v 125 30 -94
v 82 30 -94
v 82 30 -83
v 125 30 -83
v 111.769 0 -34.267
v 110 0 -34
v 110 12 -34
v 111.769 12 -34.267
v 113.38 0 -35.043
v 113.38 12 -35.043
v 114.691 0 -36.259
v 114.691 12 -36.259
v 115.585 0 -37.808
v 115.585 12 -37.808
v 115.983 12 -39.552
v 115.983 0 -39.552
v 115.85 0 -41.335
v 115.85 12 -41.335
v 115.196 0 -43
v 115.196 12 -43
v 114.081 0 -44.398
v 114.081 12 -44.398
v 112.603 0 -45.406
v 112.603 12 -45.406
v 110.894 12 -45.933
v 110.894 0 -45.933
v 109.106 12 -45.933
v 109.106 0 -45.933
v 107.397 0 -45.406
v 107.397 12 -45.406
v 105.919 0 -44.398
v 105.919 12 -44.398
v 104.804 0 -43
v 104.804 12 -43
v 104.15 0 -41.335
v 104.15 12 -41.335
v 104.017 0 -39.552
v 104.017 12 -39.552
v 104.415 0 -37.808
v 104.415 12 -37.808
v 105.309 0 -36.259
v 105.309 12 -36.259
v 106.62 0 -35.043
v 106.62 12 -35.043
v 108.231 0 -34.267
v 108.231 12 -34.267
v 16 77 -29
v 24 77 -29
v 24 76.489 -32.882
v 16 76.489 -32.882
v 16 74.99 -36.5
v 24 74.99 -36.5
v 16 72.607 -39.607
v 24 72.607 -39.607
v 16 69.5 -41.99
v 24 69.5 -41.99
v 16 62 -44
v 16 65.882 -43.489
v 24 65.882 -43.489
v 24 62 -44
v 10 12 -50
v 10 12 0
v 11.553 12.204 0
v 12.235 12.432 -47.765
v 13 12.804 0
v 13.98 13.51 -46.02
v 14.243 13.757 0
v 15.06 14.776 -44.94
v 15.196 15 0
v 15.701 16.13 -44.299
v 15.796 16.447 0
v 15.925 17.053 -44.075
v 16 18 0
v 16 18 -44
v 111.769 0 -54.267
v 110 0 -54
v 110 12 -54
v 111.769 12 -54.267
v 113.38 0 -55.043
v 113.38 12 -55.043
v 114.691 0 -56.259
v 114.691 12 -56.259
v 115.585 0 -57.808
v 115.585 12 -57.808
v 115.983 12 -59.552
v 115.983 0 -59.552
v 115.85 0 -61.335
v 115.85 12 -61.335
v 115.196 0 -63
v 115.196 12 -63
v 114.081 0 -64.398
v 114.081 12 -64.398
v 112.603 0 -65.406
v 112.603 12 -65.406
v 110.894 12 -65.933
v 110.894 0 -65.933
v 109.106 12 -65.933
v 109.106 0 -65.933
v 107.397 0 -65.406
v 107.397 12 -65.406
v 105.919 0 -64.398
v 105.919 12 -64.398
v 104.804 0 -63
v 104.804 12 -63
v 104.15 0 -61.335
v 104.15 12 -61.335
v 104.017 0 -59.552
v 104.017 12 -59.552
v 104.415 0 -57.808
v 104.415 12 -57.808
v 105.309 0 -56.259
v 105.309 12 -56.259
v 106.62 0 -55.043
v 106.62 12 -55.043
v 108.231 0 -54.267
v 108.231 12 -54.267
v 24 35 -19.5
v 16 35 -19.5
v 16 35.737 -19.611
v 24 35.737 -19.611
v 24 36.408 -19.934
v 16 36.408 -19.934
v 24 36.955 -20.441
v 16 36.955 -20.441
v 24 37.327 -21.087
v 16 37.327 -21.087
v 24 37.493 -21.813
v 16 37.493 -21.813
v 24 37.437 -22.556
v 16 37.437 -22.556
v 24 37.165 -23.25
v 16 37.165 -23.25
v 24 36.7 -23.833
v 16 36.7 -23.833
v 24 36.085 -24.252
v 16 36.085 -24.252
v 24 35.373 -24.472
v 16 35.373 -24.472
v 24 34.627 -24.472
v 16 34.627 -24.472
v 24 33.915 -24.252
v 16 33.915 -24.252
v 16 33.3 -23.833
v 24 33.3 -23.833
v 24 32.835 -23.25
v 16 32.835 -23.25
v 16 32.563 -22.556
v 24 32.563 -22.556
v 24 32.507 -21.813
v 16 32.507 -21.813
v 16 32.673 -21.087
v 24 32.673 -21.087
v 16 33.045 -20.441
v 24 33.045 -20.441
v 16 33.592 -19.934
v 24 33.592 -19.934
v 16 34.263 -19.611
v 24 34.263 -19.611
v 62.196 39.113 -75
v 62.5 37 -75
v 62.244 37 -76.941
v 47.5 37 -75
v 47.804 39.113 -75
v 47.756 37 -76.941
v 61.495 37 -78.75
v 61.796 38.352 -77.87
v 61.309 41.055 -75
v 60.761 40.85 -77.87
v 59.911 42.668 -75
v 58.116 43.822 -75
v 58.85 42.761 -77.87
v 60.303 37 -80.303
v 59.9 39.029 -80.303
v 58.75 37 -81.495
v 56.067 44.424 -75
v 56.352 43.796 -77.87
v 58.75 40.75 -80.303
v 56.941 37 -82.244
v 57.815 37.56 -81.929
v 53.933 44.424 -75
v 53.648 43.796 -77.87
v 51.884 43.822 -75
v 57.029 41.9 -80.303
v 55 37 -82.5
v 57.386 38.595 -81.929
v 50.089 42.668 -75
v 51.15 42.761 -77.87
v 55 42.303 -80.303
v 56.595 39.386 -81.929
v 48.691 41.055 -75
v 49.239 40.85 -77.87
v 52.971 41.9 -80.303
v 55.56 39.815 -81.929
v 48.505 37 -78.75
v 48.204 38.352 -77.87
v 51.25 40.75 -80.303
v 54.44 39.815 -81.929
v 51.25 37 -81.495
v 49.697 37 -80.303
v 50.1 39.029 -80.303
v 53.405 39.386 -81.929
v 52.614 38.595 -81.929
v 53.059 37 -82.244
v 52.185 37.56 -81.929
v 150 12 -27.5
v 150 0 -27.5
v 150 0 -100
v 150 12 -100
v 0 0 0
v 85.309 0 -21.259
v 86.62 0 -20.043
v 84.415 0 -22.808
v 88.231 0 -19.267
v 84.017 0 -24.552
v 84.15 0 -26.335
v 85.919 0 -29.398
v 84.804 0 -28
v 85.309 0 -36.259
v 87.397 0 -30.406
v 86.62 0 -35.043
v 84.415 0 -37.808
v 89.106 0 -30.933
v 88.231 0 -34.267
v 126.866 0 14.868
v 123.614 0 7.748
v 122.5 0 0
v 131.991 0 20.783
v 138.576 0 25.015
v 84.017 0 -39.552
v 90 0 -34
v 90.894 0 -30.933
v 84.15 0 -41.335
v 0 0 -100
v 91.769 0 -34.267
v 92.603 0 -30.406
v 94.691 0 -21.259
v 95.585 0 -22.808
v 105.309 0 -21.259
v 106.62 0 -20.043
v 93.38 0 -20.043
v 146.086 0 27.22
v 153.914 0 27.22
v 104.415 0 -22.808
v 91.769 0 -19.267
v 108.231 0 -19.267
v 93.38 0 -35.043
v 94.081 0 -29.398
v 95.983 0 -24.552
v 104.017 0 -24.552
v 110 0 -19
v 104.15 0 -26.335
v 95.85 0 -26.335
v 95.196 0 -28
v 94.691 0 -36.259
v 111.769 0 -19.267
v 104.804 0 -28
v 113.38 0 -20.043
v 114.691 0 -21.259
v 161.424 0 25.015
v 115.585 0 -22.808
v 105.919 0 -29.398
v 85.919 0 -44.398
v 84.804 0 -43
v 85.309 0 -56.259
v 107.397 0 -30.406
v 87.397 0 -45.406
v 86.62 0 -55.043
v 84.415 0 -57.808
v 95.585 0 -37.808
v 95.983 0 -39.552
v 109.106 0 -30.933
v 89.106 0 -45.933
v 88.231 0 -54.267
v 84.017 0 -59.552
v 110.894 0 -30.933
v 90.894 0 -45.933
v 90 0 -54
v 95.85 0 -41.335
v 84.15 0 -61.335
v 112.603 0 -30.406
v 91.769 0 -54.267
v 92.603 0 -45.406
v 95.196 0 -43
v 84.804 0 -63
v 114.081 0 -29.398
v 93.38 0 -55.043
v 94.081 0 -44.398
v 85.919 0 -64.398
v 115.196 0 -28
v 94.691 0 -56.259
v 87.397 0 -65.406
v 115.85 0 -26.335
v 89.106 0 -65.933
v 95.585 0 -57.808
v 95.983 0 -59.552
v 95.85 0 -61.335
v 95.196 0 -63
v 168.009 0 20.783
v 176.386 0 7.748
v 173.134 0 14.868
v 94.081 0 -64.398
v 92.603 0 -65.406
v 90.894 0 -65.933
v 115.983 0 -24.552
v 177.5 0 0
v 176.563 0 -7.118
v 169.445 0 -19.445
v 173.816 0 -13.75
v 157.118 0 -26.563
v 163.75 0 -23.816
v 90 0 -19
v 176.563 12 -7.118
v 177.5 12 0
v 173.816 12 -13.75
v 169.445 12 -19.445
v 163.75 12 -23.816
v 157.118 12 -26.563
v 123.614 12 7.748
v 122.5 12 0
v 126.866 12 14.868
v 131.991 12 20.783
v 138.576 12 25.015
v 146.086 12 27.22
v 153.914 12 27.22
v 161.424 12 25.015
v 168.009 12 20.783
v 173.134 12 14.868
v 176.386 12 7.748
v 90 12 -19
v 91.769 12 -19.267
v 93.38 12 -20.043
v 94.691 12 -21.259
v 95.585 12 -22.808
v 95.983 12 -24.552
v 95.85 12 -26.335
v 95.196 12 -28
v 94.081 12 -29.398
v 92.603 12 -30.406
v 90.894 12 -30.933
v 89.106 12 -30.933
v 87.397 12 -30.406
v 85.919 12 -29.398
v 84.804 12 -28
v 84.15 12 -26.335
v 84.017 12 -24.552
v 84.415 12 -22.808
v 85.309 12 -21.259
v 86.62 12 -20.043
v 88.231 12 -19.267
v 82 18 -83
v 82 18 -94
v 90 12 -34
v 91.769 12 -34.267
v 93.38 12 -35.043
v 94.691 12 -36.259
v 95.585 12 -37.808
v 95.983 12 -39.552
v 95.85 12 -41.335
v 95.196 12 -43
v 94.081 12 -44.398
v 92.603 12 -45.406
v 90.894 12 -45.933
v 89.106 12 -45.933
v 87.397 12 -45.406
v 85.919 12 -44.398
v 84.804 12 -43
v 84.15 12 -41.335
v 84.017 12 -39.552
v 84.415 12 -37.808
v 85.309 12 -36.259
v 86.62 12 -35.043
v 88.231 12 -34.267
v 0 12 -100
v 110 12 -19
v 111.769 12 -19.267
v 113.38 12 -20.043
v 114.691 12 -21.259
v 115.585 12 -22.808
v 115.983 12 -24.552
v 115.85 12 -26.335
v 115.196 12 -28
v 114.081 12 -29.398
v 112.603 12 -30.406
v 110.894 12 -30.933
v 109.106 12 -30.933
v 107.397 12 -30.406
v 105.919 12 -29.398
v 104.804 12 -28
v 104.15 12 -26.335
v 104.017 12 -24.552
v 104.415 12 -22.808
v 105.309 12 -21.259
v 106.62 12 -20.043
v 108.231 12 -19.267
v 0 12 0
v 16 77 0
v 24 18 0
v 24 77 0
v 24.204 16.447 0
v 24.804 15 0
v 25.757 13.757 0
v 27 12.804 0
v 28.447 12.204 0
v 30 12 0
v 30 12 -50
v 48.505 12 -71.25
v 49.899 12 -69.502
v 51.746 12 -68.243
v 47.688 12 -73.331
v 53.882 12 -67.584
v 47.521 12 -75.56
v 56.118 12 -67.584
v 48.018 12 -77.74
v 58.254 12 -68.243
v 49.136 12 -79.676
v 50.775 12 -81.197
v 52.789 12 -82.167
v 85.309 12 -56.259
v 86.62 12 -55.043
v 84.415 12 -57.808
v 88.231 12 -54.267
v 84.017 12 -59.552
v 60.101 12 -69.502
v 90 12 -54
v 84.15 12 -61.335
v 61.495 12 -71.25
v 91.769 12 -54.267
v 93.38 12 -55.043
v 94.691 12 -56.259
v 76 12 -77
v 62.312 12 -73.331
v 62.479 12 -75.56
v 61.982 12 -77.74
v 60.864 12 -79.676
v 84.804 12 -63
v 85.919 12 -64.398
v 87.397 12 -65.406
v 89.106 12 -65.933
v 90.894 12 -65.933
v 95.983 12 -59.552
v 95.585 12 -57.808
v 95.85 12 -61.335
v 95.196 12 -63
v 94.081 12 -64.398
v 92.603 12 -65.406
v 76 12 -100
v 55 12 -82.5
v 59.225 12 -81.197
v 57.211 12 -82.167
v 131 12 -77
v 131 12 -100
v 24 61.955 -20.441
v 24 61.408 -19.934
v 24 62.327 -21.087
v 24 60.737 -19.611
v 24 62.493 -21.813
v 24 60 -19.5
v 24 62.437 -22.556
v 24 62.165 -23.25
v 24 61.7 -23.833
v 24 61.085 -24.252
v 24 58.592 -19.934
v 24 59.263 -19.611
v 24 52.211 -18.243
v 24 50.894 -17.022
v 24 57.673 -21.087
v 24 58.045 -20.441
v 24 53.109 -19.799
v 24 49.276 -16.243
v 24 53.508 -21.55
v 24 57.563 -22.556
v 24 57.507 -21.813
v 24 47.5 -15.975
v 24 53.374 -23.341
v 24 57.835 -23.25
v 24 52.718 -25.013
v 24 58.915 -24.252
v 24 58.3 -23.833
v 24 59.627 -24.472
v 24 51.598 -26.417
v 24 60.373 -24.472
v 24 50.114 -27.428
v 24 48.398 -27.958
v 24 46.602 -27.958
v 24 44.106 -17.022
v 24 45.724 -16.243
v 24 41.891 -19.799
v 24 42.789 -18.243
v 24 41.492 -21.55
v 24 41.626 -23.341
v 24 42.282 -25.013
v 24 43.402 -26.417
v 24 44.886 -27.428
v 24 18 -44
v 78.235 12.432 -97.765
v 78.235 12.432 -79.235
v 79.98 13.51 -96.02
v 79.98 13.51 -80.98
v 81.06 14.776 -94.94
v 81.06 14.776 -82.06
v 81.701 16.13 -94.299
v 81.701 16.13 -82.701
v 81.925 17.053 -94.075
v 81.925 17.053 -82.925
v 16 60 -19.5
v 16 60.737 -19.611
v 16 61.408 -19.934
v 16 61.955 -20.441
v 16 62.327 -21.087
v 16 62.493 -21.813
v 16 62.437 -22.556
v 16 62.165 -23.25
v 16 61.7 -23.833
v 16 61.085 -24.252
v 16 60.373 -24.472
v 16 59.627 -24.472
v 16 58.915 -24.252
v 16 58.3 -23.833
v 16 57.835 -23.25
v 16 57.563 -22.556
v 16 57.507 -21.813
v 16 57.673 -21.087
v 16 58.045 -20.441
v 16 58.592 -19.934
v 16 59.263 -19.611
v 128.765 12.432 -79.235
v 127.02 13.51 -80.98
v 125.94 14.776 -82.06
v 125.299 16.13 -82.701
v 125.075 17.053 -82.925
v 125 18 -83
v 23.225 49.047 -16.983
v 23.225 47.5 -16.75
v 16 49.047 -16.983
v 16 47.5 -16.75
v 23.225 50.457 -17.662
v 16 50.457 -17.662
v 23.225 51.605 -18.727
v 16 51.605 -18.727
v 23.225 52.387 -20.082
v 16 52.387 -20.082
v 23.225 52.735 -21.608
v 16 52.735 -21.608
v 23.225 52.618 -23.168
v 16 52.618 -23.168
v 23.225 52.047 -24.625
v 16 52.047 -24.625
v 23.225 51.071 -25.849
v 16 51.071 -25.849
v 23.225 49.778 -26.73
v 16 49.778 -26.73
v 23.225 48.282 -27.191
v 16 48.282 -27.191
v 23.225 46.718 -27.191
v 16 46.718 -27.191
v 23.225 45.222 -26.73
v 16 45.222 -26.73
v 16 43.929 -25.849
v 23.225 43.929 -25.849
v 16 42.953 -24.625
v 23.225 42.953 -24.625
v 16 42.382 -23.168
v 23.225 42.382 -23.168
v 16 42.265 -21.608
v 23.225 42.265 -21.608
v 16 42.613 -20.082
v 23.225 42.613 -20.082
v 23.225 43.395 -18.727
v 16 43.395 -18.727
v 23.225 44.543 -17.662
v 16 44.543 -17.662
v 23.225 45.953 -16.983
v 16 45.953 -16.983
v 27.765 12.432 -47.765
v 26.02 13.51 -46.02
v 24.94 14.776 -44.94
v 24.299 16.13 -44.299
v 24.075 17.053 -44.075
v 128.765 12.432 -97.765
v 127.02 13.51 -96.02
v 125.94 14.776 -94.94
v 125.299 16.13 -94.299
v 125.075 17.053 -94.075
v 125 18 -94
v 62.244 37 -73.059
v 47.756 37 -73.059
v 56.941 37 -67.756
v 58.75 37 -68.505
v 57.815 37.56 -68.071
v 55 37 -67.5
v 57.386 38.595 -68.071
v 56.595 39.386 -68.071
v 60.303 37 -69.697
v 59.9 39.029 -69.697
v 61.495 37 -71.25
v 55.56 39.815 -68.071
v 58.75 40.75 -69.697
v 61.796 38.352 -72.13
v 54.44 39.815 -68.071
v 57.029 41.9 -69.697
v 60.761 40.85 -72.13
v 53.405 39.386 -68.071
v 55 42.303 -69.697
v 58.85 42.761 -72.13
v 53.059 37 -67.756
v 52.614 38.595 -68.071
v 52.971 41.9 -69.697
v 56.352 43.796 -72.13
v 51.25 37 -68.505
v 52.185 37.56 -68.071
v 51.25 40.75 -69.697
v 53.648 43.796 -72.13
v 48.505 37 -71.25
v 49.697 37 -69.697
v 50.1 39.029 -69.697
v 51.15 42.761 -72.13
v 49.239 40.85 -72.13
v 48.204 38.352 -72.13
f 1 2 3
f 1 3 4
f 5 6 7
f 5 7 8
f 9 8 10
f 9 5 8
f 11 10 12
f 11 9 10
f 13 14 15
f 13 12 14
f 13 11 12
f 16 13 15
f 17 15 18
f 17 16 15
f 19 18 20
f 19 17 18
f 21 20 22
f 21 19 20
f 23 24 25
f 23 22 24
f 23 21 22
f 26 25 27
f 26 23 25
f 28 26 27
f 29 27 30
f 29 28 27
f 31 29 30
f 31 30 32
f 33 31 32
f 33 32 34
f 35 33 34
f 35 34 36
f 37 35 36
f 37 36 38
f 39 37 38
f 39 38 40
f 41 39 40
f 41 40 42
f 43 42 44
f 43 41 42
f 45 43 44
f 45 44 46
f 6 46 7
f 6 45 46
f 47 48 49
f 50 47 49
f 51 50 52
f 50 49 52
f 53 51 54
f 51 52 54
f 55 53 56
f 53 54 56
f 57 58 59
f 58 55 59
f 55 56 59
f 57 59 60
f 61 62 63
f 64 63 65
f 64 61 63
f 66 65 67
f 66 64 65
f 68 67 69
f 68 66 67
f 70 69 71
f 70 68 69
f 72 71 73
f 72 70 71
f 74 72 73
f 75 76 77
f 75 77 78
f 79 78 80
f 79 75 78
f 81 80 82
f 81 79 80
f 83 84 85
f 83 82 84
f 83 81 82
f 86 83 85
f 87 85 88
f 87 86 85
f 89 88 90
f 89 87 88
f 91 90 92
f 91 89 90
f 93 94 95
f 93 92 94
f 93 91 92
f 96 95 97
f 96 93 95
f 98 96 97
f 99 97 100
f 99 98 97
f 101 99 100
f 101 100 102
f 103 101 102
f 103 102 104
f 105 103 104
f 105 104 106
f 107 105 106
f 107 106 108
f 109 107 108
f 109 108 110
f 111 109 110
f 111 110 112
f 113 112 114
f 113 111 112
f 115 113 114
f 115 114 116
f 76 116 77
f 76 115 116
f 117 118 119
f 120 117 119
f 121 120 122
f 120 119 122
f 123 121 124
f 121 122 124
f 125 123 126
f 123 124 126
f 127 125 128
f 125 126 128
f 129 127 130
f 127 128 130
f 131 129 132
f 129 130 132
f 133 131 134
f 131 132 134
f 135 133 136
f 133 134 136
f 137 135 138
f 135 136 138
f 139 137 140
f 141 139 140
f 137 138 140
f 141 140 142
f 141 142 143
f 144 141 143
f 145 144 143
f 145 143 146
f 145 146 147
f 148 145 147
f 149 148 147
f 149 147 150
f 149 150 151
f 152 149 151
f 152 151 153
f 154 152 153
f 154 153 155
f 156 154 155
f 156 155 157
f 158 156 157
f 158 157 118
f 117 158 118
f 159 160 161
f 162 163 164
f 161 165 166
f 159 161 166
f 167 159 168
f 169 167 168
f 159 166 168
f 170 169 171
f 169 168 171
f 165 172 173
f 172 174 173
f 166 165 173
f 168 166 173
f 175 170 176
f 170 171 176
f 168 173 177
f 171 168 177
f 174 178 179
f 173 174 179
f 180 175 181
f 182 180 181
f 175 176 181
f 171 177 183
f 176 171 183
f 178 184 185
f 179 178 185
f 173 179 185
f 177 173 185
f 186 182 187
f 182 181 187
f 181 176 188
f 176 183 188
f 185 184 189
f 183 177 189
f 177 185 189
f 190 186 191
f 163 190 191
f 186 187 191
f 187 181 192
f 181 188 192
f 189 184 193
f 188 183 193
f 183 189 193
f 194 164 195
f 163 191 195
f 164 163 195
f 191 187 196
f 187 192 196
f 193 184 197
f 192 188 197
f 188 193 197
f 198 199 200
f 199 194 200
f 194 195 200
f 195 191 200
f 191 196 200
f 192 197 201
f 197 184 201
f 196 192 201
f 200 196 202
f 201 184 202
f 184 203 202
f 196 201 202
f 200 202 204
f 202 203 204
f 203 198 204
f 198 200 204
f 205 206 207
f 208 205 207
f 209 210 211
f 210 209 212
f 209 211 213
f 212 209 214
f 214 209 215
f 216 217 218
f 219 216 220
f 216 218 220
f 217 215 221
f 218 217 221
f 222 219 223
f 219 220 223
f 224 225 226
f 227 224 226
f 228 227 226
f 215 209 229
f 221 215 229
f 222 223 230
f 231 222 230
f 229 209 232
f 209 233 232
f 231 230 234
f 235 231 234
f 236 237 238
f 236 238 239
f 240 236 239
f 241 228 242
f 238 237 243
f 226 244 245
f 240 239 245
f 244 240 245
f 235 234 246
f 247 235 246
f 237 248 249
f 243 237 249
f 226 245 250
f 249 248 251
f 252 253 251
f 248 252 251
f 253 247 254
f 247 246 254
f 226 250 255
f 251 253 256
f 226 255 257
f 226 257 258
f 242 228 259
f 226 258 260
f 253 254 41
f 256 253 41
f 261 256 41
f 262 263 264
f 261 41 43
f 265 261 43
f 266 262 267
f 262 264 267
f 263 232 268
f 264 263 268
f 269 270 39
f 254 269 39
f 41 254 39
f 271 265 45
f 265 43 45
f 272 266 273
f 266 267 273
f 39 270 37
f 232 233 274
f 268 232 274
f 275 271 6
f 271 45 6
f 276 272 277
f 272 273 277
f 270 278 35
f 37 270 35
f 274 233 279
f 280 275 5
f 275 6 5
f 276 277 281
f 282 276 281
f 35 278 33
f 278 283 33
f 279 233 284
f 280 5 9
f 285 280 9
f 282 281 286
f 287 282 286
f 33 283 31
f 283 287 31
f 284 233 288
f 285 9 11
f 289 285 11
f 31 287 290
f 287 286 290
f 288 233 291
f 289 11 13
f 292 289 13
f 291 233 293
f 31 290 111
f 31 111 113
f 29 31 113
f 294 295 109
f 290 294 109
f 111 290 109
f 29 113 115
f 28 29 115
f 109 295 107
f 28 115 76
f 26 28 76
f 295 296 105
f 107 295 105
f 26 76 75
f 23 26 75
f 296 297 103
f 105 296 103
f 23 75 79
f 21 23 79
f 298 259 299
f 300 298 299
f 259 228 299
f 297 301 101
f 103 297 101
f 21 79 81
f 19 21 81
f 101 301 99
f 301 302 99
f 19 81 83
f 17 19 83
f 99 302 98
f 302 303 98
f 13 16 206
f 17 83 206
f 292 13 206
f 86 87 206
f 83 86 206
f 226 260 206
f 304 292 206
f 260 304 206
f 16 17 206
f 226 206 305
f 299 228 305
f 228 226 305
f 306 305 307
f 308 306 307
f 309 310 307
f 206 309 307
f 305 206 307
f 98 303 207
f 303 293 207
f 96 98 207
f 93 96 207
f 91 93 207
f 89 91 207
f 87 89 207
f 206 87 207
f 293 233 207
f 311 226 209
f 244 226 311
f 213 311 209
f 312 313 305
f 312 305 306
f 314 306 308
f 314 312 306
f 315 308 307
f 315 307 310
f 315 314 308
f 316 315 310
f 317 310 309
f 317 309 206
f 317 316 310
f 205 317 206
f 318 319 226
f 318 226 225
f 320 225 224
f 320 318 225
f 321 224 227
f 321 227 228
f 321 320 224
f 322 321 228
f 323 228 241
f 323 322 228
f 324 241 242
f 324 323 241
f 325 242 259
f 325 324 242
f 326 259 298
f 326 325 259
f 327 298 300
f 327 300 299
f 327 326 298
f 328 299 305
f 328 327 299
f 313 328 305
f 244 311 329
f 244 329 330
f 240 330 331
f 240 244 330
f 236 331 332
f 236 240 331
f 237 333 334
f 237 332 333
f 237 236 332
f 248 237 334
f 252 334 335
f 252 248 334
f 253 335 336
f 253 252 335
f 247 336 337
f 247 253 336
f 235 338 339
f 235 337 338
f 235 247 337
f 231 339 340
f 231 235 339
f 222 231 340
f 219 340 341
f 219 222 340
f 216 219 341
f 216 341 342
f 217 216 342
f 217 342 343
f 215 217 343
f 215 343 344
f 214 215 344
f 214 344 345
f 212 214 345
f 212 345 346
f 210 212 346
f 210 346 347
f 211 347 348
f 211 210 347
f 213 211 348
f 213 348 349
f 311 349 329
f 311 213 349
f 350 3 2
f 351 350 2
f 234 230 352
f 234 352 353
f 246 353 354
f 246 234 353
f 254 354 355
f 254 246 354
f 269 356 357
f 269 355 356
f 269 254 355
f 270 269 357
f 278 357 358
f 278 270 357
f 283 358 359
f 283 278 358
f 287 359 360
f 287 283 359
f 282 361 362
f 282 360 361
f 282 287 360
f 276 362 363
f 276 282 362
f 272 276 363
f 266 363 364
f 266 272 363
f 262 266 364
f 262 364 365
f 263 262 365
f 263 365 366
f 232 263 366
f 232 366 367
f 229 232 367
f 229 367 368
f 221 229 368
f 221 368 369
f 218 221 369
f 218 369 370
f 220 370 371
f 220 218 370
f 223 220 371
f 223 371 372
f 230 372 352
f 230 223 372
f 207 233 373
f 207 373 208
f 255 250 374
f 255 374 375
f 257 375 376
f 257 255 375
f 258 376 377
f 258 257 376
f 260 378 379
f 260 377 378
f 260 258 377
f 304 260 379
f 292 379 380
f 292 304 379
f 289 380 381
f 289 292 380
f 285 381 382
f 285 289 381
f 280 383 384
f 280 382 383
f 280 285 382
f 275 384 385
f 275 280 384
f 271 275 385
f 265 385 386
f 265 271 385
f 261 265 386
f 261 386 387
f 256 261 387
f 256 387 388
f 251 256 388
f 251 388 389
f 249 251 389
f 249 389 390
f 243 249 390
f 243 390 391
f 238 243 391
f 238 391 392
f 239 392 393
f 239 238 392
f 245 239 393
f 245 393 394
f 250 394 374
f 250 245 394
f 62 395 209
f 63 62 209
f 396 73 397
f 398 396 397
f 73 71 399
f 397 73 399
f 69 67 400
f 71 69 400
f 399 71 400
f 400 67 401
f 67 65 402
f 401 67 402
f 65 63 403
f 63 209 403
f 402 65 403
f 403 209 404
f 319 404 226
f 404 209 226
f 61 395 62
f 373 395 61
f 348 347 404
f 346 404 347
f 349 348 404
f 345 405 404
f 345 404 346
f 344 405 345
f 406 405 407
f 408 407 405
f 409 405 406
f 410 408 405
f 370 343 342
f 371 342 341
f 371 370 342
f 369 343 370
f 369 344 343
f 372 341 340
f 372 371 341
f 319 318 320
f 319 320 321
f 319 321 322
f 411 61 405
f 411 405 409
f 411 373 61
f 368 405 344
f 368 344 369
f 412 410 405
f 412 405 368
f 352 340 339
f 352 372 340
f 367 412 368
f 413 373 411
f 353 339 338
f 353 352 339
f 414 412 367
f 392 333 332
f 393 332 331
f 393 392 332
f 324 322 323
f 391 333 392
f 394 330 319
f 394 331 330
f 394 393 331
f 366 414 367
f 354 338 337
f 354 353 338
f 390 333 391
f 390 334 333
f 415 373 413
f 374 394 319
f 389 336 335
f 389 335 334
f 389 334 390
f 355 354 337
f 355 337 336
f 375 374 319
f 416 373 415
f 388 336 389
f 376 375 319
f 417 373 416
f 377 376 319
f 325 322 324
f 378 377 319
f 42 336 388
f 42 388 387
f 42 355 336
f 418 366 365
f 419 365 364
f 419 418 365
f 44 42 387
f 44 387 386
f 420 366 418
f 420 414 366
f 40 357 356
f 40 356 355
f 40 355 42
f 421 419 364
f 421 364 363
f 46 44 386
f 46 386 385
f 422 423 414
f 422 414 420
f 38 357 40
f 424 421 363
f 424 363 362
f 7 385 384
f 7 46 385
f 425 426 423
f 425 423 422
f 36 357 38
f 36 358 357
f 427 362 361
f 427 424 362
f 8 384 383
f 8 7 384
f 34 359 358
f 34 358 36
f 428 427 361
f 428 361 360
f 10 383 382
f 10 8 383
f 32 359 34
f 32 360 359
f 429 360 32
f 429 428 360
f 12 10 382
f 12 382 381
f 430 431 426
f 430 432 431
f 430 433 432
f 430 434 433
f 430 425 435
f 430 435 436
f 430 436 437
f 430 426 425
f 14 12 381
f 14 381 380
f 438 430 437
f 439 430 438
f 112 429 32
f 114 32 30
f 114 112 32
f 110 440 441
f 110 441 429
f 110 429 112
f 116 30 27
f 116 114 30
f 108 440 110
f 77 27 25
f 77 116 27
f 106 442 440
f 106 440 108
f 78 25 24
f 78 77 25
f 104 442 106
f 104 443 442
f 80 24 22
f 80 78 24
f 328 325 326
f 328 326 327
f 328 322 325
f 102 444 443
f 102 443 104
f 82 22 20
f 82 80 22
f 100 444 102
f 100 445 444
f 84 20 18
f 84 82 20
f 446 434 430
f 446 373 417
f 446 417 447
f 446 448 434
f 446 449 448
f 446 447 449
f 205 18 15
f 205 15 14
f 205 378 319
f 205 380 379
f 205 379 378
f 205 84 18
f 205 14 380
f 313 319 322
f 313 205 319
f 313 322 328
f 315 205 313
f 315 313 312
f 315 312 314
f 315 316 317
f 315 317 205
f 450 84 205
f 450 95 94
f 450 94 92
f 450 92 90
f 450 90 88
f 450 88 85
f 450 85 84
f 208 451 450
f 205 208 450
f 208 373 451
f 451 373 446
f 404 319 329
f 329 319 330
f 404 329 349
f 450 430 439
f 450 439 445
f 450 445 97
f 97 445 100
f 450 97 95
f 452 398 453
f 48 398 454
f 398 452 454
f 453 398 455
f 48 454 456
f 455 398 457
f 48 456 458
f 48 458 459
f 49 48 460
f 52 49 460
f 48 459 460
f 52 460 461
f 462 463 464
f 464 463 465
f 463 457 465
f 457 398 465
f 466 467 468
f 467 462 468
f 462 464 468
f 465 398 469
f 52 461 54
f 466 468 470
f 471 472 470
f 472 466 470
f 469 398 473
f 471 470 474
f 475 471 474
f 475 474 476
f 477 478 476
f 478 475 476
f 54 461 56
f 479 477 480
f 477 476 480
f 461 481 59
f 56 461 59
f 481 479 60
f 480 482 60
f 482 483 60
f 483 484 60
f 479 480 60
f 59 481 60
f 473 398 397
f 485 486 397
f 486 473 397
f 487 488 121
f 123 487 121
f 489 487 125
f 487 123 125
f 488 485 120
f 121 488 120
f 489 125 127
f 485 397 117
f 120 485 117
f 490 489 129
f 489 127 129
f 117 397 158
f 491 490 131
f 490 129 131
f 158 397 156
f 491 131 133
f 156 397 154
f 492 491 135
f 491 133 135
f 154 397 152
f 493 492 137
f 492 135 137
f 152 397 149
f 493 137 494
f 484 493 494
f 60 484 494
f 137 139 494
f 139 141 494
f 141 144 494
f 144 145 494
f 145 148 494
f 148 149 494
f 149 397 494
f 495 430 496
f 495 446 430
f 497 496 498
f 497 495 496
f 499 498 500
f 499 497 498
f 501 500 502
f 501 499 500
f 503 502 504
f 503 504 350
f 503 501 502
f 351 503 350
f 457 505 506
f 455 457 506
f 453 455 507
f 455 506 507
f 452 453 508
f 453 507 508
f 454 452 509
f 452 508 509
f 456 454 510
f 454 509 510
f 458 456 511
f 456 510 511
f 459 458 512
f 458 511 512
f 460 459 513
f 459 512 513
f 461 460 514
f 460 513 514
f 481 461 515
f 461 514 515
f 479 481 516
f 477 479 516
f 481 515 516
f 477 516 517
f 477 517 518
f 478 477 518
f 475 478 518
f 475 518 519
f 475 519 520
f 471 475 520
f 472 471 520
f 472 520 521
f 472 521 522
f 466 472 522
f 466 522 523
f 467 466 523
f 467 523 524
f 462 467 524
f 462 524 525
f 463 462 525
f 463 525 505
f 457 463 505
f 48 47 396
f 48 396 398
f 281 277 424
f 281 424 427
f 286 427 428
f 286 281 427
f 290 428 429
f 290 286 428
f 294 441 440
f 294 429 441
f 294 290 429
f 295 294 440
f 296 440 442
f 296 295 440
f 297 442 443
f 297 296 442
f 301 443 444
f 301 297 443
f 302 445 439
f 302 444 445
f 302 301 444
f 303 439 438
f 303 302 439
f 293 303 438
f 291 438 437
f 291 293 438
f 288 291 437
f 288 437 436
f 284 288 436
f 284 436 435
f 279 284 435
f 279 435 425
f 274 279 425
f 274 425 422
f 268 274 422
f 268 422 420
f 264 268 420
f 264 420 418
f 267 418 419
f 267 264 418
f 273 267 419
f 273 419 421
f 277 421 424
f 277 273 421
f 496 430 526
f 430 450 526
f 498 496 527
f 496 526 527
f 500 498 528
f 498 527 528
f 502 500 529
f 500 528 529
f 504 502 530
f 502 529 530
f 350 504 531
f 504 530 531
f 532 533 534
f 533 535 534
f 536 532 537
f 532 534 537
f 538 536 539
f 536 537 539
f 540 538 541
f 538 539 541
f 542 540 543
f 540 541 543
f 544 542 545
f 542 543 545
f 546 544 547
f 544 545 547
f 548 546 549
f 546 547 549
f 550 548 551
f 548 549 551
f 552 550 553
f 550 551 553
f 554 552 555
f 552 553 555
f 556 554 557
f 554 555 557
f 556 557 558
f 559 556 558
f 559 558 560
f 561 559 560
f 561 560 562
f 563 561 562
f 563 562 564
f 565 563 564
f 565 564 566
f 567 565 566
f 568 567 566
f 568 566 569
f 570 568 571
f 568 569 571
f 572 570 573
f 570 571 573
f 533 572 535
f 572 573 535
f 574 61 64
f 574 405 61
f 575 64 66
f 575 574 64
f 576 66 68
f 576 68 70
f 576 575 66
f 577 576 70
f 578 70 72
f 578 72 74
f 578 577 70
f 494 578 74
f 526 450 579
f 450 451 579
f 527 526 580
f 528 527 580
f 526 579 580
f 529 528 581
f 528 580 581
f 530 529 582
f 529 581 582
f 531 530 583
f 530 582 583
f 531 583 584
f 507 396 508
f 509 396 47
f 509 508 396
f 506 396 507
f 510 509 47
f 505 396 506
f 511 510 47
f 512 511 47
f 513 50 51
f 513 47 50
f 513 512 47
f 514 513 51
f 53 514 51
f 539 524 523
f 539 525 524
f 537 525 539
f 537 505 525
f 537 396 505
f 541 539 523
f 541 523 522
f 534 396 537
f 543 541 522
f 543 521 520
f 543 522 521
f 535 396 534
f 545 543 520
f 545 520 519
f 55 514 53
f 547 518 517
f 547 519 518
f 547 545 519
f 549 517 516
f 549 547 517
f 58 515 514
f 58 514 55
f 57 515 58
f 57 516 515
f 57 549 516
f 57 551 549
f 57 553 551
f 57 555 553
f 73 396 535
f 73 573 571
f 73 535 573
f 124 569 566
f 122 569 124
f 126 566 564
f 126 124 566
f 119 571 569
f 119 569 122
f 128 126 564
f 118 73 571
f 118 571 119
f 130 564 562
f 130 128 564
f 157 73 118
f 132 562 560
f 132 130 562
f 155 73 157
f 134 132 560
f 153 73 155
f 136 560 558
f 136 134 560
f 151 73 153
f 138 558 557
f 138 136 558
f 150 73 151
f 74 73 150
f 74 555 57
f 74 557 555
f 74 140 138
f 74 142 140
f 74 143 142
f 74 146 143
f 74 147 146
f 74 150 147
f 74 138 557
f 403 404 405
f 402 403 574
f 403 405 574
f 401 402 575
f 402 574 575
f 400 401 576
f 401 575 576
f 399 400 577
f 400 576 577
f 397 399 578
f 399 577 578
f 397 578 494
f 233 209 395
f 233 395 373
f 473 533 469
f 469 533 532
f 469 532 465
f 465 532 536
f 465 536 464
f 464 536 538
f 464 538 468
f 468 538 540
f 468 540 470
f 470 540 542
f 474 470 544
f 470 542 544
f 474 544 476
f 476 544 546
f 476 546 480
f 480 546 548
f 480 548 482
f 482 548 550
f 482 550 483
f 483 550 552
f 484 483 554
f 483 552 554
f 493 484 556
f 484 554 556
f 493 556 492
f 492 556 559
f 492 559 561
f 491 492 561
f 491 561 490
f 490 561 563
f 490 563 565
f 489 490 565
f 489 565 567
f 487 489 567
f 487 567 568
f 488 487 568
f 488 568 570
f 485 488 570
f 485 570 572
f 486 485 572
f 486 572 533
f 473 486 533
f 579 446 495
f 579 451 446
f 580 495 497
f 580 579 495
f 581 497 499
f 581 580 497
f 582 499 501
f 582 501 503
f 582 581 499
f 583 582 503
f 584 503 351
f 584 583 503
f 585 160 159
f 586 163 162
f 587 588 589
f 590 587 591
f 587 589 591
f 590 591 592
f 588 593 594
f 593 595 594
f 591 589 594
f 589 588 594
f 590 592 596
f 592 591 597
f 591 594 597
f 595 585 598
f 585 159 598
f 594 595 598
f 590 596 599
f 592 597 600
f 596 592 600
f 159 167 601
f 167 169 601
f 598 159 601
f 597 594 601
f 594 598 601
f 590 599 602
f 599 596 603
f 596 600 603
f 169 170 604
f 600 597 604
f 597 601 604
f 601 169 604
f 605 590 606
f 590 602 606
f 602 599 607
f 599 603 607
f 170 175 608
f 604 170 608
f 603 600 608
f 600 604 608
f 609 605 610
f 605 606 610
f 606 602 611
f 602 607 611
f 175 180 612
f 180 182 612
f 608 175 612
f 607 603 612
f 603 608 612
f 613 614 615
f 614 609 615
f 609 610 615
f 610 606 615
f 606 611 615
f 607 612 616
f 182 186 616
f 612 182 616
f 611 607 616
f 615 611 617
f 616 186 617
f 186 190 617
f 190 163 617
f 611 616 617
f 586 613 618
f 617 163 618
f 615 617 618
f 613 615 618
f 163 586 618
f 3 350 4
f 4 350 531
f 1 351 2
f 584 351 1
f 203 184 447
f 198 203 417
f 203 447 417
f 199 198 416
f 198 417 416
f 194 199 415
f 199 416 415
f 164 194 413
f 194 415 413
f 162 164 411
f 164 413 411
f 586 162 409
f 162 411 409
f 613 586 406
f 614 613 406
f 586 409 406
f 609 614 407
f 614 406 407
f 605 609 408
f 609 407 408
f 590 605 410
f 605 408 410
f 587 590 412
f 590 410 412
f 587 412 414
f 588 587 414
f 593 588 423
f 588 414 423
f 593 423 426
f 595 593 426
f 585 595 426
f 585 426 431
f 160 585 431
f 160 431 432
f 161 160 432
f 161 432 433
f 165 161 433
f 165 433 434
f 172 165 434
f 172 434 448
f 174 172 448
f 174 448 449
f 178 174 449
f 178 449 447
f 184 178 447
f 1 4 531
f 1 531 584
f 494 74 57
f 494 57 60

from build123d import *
from build123d.topology import SkipClean

# Parameters (mm, degrees)
SKETCH1_W                        = 150
SKETCH1_H                        = 100
BOSS_EXTRUDE1_DEPTH              = 12
SKETCH2_W                        = 8
SKETCH2_H                        = 44
BOSS_EXTRUDE2_DEPTH              = 65
FILLET1_R                        = 6
CUT_EXTRUDE1_DEPTH               = 179.339563754
F_5_0_5_DIAMETER_HOLE1_D         = 5
M12X1_5_TAPPED_HOLE1_D           = 10.5
M12X1_5_TAPPED_HOLE1_CSINK_D     = 12.05
M12X1_5_TAPPED_HOLE1_CSINK_ANGLE = 90
SKETCH8_R                        = 7.5
BOSS_EXTRUDE3_DEPTH              = 25
BOSS_EXTRUDE4_DEPTH              = 12
CUT_EXTRUDE2_DEPTH               = 214.848661441
CUT_EXTRUDE2_DEPTH_BACK          = 214.848661441
SKETCH10_R                       = 6
REVOLVE1_ANGLE                   = 180
SKETCH12_W                       = 43
SKETCH12_H                       = 11
BOSS_EXTRUDE5_DEPTH              = 18
FILLET2_R                        = 6


with BuildPart() as part:
    # Sketch1 → Boss-Extrude1 (new body)
    with BuildSketch(Plane(origin=(0, 0, 0), x_dir=(1, 0, 0), z_dir=(0, 1, 0))):
        with Locations((75, 50)):
            Rectangle(SKETCH1_W, SKETCH1_H)
    extrude(amount=BOSS_EXTRUDE1_DEPTH)

    # Sketch2 → Boss-Extrude2 (add)
    with BuildSketch(Plane(origin=(0, 12, 0), x_dir=(1, 0, 0), z_dir=(0, 1, 0))):
        with Locations((20, 22)):
            Rectangle(SKETCH2_W, SKETCH2_H)
    extrude(amount=BOSS_EXTRUDE2_DEPTH)

    # Fillet1
    fillet1_edges = [part.edges().sort_by_distance(p)[0] for p in [
        (16, 12, -22),
        (24, 12, -22),
        (20, 12, -44),
    ]]
    fillet(fillet1_edges, radius=FILLET1_R)

    # Sketch3 → Cut-Extrude1 (cut, through all)
    with BuildSketch(Plane(origin=(24, 0, 0), x_dir=(0, 0, -1), z_dir=(1, 0, 0))):
        with BuildLine():
            Line((44, 77), (29, 77))
            ThreePointArc((29, 77), (39.606601718, 72.606601718), (44, 62))
            Line((44, 62), (44, 77))
        make_face()
    extrude(amount=-CUT_EXTRUDE1_DEPTH, mode=Mode.SUBTRACT)

    # Ø5.0 (5) Diameter Hole1 (through all)
    with Locations(Plane(origin=(24, 0, 0), x_dir=(0, 0, -1), z_dir=(1, 0, 0))):
        with Locations((22, 60), (22, 35)):
            Hole(F_5_0_5_DIAMETER_HOLE1_D / 2)

    # M12x1.5 Tapped Hole1 (through all)
    with Locations(Plane(origin=(24, 0, 0), x_dir=(0, 0, -1), z_dir=(1, 0, 0))):
        with Locations((22, 47.5)):
            CounterSinkHole(M12X1_5_TAPPED_HOLE1_D / 2, M12X1_5_TAPPED_HOLE1_CSINK_D / 2, counter_sink_angle=M12X1_5_TAPPED_HOLE1_CSINK_ANGLE)

    # Sketch8 → Boss-Extrude3 (add)
    with BuildSketch(Plane(origin=(0, 12, 0), x_dir=(1, 0, 0), z_dir=(0, 1, 0))):
        with Locations(Location((55, 75, 0), (0, 0, 90))):
            Circle(SKETCH8_R)
    extrude(amount=BOSS_EXTRUDE3_DEPTH)

    # Sketch9 → Boss-Extrude4 (add)
    with BuildSketch(Plane(origin=(0, 12, 0), x_dir=(1, 0, 0), z_dir=(0, 1, 0))):
        with BuildLine():
            ThreePointArc((177.5, 0), (169.445436483, 19.445436483), (150, 27.5))
            Line((150, 27.5), (150, 0))
            Line((150, 0), (122.5, 0))
            ThreePointArc((122.5, 0), (150, -27.5), (177.5, 0))
        make_face()
        with BuildLine():
            Line((150, 0), (150, 27.5))
            ThreePointArc((150, 27.5), (130.554563517, 19.445436483), (122.5, 0))
            Line((122.5, 0), (150, 0))
        make_face()
    extrude(amount=-BOSS_EXTRUDE4_DEPTH)

    # Sketch10 → Cut-Extrude2 (cut, two sides: drawn at the far end of the back side and taken through both)
    with BuildSketch(Plane(origin=(0, 12, 0), x_dir=(1, 0, 0), z_dir=(0, 1, 0)).offset(-CUT_EXTRUDE2_DEPTH_BACK)):
        with Locations(Location((90, 60, 0), (0, 0, 270))):
            Circle(SKETCH10_R)
        with Locations(Location((110, 60, 0), (0, 0, 270))):
            Circle(SKETCH10_R)
        with Locations(Location((90, 40, 0), (0, 0, 270))):
            Circle(SKETCH10_R)
        with Locations(Location((110, 40, 0), (0, 0, 270))):
            Circle(SKETCH10_R)
        with Locations(Location((90, 25, 0), (0, 0, 270))):
            Circle(SKETCH10_R)
        with Locations(Location((110, 25, 0), (0, 0, 270))):
            Circle(SKETCH10_R)
    extrude(amount=CUT_EXTRUDE2_DEPTH + CUT_EXTRUDE2_DEPTH_BACK, mode=Mode.SUBTRACT)

    # Sketch11 → Revolve1 (revolve)
    with SkipClean():  # the faces are left unmerged after this step: merging them gives an invalid solid
        with BuildSketch(Plane(origin=(0, 37, 0), x_dir=(1, 0, 0), z_dir=(0, 1, 0))):
            with BuildLine():
                ThreePointArc((62.5, 75), (60.303300859, 80.303300859), (55, 82.5))
                Line((55, 82.5), (55, 67.5))
                ThreePointArc((55, 67.5), (60.303300859, 69.696699141), (62.5, 75))
            make_face()
            with BuildLine():
                Line((55, 67.5), (55, 82.5))
                ThreePointArc((55, 82.5), (47.5, 75), (55, 67.5))
            make_face()
        revolve(axis=Axis((55, 37, -82.5), (0, 0, 1)), revolution_arc=REVOLVE1_ANGLE)

    # Sketch12 → Boss-Extrude5 (add)
    with BuildSketch(Plane(origin=(0, 12, 0), x_dir=(1, 0, 0), z_dir=(0, 1, 0))):
        with Locations((103.5, 88.5)):
            Rectangle(SKETCH12_W, SKETCH12_H)
    extrude(amount=BOSS_EXTRUDE5_DEPTH)

    # Fillet2
    fillet2_edges = [part.edges().sort_by_distance(p)[0] for p in [
        (82, 12, -88.5),
        (103.5, 12, -83),
        (125, 12, -88.5),
        (103.5, 12, -94),
    ]]
    fillet(fillet2_edges, radius=FILLET2_R - 0.0001)  # a hair under: the kernel refuses the full size


solid = part.part
